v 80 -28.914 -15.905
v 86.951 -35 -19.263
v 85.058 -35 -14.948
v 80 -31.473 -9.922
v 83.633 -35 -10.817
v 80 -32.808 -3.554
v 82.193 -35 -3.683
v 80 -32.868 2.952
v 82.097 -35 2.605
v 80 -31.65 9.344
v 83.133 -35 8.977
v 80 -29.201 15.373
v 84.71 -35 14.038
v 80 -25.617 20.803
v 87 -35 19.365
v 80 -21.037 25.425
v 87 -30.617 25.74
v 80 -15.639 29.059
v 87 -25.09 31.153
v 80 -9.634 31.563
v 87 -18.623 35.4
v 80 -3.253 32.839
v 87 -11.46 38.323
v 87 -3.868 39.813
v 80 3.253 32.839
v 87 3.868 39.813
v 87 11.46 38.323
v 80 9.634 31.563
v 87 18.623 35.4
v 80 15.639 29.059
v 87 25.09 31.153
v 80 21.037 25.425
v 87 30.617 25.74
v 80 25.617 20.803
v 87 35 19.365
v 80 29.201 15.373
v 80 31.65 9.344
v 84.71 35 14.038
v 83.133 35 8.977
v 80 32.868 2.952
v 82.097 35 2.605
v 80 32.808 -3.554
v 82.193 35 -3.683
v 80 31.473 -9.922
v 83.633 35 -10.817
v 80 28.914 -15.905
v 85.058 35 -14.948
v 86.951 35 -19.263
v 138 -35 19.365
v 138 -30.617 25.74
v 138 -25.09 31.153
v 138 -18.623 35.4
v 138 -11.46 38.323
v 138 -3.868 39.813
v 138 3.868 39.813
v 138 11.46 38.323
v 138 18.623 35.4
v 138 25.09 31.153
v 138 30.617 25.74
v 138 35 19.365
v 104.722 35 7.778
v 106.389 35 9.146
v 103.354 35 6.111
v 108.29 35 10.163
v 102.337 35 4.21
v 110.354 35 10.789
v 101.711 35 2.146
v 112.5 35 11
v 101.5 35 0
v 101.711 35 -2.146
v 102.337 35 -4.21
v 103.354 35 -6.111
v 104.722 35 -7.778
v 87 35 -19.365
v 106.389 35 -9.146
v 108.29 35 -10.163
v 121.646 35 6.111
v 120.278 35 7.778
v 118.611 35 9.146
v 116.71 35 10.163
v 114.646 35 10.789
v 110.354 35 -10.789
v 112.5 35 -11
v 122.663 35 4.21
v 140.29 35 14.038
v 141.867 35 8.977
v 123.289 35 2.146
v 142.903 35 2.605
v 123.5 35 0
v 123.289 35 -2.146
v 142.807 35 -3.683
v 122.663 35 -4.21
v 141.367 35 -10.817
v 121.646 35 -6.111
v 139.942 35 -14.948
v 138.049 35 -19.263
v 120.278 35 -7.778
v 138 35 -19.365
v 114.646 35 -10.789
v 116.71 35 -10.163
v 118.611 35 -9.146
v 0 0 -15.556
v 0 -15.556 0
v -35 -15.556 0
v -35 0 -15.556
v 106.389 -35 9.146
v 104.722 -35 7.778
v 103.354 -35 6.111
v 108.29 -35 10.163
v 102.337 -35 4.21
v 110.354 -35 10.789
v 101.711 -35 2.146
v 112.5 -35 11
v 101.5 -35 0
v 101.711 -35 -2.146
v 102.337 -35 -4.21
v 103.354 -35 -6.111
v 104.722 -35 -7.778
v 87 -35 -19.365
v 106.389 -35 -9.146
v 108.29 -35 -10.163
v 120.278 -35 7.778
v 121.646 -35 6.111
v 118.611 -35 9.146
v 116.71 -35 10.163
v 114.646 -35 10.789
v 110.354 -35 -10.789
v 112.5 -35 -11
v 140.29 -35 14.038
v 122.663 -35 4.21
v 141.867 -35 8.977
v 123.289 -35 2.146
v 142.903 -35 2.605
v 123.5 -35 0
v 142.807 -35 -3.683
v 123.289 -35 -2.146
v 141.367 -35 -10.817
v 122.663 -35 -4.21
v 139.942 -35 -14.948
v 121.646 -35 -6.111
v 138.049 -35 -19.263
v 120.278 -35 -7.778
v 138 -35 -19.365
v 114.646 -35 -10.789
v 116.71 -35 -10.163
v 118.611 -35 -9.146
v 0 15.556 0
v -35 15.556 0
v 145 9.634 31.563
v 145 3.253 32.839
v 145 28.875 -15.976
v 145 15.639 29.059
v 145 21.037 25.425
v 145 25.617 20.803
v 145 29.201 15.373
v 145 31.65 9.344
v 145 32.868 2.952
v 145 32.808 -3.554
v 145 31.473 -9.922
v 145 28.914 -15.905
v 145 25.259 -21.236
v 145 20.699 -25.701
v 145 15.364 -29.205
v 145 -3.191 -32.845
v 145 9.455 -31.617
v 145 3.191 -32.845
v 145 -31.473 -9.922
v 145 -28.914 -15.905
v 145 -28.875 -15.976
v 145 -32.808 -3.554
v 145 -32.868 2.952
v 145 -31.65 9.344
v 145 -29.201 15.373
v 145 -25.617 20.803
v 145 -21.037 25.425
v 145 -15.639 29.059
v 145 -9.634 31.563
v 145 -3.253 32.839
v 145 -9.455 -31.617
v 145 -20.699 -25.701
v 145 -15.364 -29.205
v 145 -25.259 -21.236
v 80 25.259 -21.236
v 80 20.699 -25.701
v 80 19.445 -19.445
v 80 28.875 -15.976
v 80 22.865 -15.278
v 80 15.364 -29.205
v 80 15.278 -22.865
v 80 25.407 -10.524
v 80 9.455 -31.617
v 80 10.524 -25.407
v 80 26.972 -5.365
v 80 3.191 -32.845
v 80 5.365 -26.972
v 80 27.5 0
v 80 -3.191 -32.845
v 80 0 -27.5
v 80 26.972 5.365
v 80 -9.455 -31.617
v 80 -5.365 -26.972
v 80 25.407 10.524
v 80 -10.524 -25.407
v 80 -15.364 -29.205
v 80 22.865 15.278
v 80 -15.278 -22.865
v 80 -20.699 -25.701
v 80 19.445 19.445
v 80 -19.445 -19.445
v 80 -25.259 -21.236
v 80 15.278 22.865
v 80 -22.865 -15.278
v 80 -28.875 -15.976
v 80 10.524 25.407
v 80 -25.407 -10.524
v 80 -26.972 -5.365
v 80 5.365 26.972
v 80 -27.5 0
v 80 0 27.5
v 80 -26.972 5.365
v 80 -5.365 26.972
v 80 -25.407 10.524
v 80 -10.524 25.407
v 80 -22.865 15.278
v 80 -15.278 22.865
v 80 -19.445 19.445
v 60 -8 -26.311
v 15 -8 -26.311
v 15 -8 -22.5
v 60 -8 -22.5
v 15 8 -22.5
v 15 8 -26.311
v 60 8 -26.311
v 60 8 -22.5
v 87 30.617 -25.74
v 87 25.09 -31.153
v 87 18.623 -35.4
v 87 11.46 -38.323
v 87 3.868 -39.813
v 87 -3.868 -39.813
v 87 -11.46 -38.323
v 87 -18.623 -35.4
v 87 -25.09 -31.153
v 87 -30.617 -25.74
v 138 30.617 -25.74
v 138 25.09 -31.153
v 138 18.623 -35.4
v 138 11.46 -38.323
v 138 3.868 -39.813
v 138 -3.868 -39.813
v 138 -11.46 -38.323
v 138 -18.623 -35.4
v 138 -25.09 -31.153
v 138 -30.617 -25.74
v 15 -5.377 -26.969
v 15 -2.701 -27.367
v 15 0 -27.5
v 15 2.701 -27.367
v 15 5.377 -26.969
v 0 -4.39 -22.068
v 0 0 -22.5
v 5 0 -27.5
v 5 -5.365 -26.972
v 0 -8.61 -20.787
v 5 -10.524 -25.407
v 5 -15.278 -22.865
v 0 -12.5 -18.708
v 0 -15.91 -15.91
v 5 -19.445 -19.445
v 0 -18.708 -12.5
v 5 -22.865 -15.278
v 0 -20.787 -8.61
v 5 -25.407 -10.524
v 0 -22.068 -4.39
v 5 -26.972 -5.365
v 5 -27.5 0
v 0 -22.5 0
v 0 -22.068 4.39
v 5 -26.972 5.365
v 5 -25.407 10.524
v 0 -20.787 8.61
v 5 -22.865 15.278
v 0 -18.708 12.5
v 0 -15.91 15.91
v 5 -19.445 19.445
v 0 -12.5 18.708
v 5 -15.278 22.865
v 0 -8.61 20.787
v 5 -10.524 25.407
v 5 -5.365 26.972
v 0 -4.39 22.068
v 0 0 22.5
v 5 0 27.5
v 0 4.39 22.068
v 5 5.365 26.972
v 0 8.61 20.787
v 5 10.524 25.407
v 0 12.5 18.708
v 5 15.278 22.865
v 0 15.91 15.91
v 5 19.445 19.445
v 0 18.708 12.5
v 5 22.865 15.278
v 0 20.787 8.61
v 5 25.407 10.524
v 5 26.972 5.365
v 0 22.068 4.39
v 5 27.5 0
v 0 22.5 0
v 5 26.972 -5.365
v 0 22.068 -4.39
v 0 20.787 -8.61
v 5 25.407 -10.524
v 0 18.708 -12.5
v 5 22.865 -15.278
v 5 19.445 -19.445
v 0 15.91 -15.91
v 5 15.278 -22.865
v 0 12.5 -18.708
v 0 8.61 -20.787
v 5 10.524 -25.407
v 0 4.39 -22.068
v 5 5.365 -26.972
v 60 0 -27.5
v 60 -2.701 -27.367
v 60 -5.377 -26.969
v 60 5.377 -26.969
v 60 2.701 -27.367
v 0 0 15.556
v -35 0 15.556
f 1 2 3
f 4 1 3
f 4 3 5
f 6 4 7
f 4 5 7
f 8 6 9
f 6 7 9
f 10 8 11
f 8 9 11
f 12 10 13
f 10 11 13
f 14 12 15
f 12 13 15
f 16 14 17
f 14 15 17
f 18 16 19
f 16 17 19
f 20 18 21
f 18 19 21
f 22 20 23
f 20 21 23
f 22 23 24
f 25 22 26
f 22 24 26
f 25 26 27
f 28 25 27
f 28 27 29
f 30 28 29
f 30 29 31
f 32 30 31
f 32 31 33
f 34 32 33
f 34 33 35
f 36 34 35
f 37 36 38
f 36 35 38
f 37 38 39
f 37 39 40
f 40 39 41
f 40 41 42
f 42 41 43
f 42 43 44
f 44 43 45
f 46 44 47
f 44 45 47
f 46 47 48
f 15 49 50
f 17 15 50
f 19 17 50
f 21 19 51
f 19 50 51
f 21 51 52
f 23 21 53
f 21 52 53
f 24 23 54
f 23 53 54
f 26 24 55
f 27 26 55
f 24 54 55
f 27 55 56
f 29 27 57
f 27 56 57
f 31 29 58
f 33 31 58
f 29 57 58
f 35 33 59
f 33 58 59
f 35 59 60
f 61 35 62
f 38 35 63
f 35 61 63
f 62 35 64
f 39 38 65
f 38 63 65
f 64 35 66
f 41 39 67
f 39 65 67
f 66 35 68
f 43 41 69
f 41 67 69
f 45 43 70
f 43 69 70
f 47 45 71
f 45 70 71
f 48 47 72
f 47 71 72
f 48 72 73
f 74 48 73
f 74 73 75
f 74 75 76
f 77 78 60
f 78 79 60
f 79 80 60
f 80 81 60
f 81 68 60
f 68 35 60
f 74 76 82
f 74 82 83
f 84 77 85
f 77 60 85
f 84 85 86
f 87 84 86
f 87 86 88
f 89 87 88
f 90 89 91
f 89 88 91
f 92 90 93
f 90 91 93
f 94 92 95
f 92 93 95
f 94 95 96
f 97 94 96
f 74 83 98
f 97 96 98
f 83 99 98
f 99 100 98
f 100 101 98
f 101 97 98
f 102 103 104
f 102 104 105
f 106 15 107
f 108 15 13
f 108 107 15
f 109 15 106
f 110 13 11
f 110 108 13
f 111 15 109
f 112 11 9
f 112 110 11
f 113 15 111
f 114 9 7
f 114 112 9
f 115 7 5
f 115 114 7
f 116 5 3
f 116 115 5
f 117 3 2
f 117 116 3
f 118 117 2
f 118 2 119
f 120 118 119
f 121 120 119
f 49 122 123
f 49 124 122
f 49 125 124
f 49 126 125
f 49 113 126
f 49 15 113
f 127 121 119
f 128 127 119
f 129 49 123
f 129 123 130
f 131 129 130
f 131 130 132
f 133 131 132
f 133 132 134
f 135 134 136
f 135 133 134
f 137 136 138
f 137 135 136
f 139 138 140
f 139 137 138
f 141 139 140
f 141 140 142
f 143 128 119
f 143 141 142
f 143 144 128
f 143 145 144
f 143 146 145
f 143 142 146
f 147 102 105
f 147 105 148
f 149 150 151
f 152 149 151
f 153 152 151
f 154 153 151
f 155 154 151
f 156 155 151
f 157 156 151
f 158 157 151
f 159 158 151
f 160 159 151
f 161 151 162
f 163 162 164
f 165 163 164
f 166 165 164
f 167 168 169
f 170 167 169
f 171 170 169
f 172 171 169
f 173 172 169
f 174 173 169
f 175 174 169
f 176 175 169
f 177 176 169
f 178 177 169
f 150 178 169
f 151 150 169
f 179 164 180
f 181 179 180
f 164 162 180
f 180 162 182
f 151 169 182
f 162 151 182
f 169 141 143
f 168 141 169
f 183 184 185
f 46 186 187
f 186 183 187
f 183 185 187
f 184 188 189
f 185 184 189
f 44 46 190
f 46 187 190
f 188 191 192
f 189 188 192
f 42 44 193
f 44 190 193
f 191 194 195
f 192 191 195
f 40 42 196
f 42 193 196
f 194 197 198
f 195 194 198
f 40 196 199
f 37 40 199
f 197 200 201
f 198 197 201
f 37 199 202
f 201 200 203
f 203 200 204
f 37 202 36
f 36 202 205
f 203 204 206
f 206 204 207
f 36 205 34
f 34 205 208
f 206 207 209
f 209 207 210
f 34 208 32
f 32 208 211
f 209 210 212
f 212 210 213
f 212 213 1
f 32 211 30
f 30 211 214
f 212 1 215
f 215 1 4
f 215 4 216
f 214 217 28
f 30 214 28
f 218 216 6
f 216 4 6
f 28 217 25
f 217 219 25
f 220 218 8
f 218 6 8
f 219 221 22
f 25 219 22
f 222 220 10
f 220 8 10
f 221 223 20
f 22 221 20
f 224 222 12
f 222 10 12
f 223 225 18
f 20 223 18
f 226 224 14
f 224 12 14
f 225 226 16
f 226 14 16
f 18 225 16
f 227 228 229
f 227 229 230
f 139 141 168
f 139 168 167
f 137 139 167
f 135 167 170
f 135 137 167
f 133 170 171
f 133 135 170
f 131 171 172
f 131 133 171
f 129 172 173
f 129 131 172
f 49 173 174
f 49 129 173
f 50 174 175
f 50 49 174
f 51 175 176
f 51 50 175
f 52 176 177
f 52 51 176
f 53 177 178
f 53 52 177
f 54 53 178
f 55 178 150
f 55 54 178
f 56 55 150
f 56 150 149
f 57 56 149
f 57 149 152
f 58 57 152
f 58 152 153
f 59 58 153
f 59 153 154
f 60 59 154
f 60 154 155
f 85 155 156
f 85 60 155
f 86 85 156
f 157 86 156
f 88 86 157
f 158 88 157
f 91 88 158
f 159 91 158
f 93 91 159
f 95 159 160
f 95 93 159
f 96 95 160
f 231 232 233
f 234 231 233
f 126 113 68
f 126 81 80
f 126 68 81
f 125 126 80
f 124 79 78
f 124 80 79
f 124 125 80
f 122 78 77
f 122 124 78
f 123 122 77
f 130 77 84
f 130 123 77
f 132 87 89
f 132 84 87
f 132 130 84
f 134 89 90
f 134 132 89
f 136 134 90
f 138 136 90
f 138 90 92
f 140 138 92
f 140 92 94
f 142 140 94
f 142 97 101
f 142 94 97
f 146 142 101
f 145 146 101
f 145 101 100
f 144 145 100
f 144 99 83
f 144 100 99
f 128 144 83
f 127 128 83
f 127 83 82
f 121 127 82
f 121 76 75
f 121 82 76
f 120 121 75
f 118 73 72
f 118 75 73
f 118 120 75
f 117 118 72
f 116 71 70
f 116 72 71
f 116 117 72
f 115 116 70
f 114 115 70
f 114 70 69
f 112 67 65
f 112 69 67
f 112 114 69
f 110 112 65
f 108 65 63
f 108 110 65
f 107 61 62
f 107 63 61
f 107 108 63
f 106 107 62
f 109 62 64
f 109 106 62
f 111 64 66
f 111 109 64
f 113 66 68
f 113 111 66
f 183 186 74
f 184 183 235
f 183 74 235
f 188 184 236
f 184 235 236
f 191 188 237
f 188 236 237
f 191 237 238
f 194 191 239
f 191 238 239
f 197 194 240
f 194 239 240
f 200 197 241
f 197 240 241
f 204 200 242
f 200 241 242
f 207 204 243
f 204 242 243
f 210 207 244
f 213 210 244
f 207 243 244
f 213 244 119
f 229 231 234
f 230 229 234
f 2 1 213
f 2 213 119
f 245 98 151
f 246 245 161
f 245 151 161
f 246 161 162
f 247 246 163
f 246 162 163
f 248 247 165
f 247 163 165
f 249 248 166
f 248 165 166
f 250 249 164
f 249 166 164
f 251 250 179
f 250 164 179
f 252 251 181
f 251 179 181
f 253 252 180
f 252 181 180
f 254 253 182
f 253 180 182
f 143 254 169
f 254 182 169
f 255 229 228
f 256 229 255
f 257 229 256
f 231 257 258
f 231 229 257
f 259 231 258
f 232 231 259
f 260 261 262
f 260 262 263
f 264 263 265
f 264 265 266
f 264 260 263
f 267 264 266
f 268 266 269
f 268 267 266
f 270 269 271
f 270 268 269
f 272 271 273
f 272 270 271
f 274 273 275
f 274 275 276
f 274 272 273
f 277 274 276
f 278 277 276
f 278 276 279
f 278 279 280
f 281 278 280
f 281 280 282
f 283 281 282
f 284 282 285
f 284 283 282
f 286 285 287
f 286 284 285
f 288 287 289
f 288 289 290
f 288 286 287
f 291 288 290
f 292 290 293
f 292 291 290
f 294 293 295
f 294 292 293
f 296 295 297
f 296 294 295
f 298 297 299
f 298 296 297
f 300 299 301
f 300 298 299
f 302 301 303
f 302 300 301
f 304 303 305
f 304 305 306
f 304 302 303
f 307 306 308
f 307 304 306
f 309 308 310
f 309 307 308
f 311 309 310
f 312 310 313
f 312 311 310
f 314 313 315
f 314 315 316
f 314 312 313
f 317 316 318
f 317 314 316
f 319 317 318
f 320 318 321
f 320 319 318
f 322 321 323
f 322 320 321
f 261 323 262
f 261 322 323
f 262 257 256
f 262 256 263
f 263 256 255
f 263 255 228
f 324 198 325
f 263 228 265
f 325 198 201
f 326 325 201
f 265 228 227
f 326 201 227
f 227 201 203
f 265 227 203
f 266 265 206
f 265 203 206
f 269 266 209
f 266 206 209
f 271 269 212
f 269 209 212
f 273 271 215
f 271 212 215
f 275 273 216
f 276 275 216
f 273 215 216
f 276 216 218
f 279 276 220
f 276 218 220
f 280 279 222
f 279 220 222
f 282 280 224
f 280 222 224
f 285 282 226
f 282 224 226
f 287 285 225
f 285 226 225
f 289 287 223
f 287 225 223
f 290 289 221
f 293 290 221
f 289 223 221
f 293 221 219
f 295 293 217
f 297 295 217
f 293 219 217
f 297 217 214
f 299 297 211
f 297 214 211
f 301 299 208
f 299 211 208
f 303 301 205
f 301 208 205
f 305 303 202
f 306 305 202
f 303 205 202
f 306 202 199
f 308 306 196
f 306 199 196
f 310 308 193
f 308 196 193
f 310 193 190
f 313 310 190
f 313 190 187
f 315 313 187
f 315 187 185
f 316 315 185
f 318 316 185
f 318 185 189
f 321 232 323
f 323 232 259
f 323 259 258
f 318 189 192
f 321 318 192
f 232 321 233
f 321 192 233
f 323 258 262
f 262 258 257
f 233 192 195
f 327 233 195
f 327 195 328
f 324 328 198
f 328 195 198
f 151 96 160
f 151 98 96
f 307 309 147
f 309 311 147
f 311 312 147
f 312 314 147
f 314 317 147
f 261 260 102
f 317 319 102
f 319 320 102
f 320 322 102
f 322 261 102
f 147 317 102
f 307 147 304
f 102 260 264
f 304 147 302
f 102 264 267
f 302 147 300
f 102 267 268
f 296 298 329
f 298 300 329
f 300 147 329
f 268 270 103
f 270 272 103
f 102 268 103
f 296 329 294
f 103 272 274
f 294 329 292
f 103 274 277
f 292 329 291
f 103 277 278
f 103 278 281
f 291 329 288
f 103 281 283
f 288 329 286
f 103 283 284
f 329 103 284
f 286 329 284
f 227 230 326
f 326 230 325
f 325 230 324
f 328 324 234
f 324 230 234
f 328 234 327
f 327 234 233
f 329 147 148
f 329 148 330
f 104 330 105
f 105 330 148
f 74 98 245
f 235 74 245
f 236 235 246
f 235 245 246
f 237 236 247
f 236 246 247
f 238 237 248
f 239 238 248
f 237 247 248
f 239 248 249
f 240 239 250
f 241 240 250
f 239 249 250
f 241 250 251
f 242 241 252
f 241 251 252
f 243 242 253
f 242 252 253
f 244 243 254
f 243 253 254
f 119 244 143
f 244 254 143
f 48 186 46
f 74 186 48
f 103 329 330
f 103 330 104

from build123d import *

# Parameters (mm, degrees)
EXTRUDE_1_DEPTH          = 35
SKETCH_4_W               = 45.00000000000001
SKETCH_4_H               = 5
CUT_EXTRUDE_1_DEPTH      = 8
CUT_EXTRUDE_2_DEPTH      = 189.67962264113208
CUT_EXTRUDE_3_DEPTH      = 166.90660023037057
CUT_EXTRUDE_3_DEPTH_BACK = 166.90660023037057
SKETCH_6_R               = 10.999999999999993
CHAMFER_1_SIZE           = 7
CHAMFER_2_SIZE           = 5


with BuildPart() as part:
    # Эскиз1 → Повернуть1 (revolve)
    with BuildSketch(Plane.XY, mode=Mode.PRIVATE) as revolve_1_sk:
        Polygon((0, 0), (0, 27.5), (80, 27.500000000000004), (80, 40.00000000000001), (145, 40.00000000000001), (145, 1e-17), align=None)
    revolve(revolve_1_sk.sketch.rotate(Axis((0, 0, 0), (-1, 0, 0)), 90), axis=Axis((0, 0, 0), (-1, 0, 0)))

    # Эскиз3 → Бобышка-Вытянуть1 (add)
    with BuildSketch(Plane.ZY):
        Polygon((-1.63e-15, -15.556349186104034), (-15.556349186104049, 8.31e-15), (-6.49e-15, 15.55634918610405), (15.55634918610404, 8.54e-15), align=None)
    extrude(amount=EXTRUDE_1_DEPTH)

    # Эскиз4 → Вырез-Вытянуть1 (cut, symmetric)
    with BuildSketch(Plane(origin=(0, 0, 0), x_dir=(1, 0, 0), z_dir=(0, 1, 0))):
        with Locations((37.50000000000001, 25.000000000000004)):
            Rectangle(SKETCH_4_W, SKETCH_4_H)
    extrude(amount=CUT_EXTRUDE_1_DEPTH, both=True, mode=Mode.SUBTRACT)

    # Эскиз5 → Вырез-Вытянуть2 (cut, symmetric)
    with BuildSketch(Plane(origin=(145, 0, 0), x_dir=(0, 0, -1), z_dir=(1, 0, 0))):
        Polygon((-220.66774826766613, 35), (-19.364916731037095, 35), (19.364916731037095, 35), (220.66774826766613, 35), (220.66774826766613, 437.6056630732581), (-220.66774826766613, 437.6056630732581), align=None)
    cut_extrude_2 = extrude(amount=CUT_EXTRUDE_2_DEPTH, both=True, mode=Mode.SUBTRACT)

    # Зеркальное отражение1: Вырез-Вытянуть2 across plane
    add(cut_extrude_2.mirror(Plane.ZX), mode=Mode.SUBTRACT)

    # Эскиз6 → Вырез-Вытянуть3 (cut, two sides: drawn at the far end of the back side and taken through both)
    with BuildSketch(Plane(origin=(0, 35, 0), x_dir=(1, 0, 0), z_dir=(0, 1, 0)).offset(-CUT_EXTRUDE_3_DEPTH_BACK)):
        with Locations(Location((112.5, 0, 0), (0, 0, 270))):
            Circle(SKETCH_6_R)
    extrude(amount=CUT_EXTRUDE_3_DEPTH + CUT_EXTRUDE_3_DEPTH_BACK, mode=Mode.SUBTRACT)

    # Фаска1
    chamfer_1_edges = [part.edges().sort_by_distance(p)[0] for p in [
        (80, 3.55e-15, -40.00000000000001),
    ]]
    chamfer(chamfer_1_edges, length=CHAMFER_1_SIZE)
    chamfer_1_2_edges = [part.edges().sort_by_distance(p)[0] for p in [
        (80, -1.421e-14, 40.000000000000014),
    ]]
    chamfer(chamfer_1_2_edges, length=CHAMFER_1_SIZE - 0.0001)  # a hair under: the kernel refuses the full size
    chamfer_1_3_edges = [part.edges().sort_by_distance(p)[0] for p in [
        (145, 3.55e-15, -40.00000000000001),
    ]]
    chamfer(chamfer_1_3_edges, length=CHAMFER_1_SIZE)
    chamfer_1_4_edges = [part.edges().sort_by_distance(p)[0] for p in [
        (145, -1.421e-14, 40.000000000000014),
    ]]
    chamfer(chamfer_1_4_edges, length=CHAMFER_1_SIZE - 0.0001)  # a hair under: the kernel refuses the full size

    # Фаска2
    chamfer_2_edges = [part.edges().sort_by_distance(p)[0] for p in [
        (0, -6.42e-15, 27.5),
    ]]
    chamfer(chamfer_2_edges, length=CHAMFER_2_SIZE)


solid = part.part
